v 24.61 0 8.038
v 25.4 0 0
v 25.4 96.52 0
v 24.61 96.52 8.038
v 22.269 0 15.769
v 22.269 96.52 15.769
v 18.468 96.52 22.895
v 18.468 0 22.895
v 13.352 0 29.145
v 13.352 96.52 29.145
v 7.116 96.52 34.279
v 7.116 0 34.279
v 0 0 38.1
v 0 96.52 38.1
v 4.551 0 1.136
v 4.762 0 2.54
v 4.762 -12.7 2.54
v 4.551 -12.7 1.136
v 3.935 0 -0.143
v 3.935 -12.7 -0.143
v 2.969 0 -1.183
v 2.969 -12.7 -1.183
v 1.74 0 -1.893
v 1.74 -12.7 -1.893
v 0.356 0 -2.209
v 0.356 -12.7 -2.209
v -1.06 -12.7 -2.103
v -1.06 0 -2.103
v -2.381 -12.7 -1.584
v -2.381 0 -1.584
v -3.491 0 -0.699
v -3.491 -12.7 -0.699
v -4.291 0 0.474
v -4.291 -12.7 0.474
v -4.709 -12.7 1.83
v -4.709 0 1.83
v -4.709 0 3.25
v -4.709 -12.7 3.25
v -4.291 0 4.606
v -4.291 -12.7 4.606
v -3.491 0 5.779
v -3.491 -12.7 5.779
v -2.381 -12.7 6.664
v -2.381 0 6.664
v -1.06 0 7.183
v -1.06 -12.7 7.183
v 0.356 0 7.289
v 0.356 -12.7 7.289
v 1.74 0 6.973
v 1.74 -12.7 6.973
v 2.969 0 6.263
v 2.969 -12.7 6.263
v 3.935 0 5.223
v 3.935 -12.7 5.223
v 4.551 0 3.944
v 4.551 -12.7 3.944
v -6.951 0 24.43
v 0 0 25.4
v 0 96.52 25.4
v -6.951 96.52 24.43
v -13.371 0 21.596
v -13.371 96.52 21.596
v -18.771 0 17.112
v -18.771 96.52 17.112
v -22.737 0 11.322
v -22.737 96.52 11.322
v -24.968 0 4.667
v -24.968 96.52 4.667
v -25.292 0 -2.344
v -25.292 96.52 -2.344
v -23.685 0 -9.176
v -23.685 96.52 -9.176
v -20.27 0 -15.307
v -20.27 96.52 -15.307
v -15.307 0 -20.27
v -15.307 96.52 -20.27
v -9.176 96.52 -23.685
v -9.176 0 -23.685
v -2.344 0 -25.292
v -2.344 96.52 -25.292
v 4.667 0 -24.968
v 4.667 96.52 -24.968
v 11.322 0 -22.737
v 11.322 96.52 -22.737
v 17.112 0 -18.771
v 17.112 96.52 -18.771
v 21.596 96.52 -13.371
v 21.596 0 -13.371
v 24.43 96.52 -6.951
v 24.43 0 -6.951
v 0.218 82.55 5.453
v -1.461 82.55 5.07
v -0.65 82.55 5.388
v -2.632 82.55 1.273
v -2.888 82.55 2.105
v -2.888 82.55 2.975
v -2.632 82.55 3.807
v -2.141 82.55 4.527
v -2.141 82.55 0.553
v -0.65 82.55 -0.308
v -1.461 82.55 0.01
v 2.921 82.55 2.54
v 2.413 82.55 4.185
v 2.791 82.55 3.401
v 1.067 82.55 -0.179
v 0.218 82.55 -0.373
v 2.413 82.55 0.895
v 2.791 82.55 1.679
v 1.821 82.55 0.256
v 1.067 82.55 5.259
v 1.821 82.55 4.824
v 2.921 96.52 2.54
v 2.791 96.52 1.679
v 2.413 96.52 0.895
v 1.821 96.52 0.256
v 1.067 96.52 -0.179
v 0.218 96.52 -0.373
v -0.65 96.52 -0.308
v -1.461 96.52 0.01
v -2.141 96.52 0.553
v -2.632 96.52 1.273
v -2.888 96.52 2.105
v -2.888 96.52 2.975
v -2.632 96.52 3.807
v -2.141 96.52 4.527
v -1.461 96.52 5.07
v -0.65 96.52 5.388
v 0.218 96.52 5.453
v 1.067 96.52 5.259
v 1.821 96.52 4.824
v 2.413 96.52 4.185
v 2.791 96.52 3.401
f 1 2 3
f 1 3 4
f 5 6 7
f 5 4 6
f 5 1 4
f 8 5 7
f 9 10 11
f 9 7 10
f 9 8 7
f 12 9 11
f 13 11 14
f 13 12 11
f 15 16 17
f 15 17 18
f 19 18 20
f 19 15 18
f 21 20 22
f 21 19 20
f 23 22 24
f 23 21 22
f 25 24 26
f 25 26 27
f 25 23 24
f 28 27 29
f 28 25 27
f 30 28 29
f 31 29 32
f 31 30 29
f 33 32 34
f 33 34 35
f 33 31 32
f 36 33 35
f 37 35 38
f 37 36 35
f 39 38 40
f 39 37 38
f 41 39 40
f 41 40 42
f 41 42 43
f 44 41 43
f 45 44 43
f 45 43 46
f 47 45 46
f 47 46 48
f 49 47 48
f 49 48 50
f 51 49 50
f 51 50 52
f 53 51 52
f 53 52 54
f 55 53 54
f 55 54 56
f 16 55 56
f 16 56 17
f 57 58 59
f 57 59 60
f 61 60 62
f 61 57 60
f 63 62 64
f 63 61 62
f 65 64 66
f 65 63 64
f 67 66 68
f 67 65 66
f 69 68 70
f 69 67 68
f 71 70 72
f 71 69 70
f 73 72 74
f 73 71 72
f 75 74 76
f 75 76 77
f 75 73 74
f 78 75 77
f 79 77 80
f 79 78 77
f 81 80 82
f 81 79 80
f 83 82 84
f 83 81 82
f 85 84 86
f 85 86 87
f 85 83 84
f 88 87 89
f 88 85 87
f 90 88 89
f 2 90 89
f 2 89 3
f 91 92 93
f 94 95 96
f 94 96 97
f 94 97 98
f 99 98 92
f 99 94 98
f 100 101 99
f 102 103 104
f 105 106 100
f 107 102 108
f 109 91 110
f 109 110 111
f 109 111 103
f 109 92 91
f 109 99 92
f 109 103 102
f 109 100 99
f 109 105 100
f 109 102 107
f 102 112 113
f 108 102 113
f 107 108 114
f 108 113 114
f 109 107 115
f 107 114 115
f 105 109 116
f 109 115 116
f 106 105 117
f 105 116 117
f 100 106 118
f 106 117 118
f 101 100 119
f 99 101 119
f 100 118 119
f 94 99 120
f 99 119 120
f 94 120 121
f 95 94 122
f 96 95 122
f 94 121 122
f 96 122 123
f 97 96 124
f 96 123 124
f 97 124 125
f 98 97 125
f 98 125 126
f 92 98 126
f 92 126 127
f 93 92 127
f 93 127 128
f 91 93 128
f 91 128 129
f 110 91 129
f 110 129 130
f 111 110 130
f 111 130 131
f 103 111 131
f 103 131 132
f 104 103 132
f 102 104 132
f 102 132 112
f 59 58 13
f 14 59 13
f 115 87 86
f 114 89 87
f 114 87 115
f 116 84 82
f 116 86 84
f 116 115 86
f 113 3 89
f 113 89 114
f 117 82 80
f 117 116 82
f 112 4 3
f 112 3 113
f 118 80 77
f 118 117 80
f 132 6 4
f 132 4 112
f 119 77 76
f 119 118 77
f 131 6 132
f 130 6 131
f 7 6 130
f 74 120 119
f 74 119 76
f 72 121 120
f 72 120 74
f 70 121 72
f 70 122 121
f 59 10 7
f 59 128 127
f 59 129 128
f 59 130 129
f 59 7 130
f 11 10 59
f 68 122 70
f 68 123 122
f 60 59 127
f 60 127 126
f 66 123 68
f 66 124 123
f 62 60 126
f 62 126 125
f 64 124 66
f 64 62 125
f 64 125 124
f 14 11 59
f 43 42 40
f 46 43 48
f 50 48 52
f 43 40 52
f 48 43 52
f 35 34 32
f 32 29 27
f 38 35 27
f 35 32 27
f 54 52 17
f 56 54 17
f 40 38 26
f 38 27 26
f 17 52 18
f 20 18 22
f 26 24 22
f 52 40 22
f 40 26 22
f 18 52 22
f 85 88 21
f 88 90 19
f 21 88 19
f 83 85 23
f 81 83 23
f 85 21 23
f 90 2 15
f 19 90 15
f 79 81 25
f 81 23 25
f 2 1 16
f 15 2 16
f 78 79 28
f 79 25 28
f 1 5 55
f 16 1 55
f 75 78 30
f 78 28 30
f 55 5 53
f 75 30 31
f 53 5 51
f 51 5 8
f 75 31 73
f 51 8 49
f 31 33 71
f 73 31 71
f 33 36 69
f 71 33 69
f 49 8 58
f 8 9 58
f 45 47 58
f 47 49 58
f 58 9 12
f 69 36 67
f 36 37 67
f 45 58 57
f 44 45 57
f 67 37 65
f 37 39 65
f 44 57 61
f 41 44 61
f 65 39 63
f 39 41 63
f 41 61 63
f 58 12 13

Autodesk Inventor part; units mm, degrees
ref_plane "YZ Plane" through (0, 0, 0) normal (1, 0, 0) x (0, 1, 0)
ref_plane "XZ Plane" through (0, 0, 0) normal (0, 1, 0) x (-1, 0, 0)
ref_plane "XY Plane" through (0, 0, 0) normal (0, 0, 1) x (1, 0, 0)
sketch "Sketch1" plane through (0, 0, 0) normal (0, 1, 0) x (-1, 0, 0)
  circle A0 centre (0, 0) radius 25.4
  line L0 (0, 25.4) -> (0, 38.1)
  line L1 (0, 0) -> (0, 25.4) construction
  arc A1 (0, 38.1) -> (-25.4, 0) centre (15.875, 0) ccw
  line L2 (0, 0) -> (-25.4, 0) construction
  dimension "d0" = 50.8
  dimension "d1" = 12.7
extrude "Extrusion1" add sketch "Sketch1" along normal blind 96.52
ref_plane "Work Plane1" through (0, 48.26, 0) normal (0, 1, 0) x (1, 0, 0)
sketch "Sketch2" plane through (0, 96.52, 0) normal (0, 1, 0) x (1, 0, 0)
  circle A0 centre (0, -2.54) radius 2.921
  circle A1 centre (0, -2.54) radius 4.7625
  circle A2 centre (0, -2.54) radius 2.286
  point P0 (0, 0)
  dimension "d4" = 2.54
  dimension "d5" = 5.842
  dimension "d6" = 9.525
  dimension "d11" = 4.572
extrude "Extrusion2" add sketch "Sketch2" against normal blind 12.7 from surface at -96.52 contours A0 | A1 | A2
extrude "Extrusion3" cut sketch "Sketch2" against normal blind 13.97 contours A0 | A2
properties part number "Drum"
